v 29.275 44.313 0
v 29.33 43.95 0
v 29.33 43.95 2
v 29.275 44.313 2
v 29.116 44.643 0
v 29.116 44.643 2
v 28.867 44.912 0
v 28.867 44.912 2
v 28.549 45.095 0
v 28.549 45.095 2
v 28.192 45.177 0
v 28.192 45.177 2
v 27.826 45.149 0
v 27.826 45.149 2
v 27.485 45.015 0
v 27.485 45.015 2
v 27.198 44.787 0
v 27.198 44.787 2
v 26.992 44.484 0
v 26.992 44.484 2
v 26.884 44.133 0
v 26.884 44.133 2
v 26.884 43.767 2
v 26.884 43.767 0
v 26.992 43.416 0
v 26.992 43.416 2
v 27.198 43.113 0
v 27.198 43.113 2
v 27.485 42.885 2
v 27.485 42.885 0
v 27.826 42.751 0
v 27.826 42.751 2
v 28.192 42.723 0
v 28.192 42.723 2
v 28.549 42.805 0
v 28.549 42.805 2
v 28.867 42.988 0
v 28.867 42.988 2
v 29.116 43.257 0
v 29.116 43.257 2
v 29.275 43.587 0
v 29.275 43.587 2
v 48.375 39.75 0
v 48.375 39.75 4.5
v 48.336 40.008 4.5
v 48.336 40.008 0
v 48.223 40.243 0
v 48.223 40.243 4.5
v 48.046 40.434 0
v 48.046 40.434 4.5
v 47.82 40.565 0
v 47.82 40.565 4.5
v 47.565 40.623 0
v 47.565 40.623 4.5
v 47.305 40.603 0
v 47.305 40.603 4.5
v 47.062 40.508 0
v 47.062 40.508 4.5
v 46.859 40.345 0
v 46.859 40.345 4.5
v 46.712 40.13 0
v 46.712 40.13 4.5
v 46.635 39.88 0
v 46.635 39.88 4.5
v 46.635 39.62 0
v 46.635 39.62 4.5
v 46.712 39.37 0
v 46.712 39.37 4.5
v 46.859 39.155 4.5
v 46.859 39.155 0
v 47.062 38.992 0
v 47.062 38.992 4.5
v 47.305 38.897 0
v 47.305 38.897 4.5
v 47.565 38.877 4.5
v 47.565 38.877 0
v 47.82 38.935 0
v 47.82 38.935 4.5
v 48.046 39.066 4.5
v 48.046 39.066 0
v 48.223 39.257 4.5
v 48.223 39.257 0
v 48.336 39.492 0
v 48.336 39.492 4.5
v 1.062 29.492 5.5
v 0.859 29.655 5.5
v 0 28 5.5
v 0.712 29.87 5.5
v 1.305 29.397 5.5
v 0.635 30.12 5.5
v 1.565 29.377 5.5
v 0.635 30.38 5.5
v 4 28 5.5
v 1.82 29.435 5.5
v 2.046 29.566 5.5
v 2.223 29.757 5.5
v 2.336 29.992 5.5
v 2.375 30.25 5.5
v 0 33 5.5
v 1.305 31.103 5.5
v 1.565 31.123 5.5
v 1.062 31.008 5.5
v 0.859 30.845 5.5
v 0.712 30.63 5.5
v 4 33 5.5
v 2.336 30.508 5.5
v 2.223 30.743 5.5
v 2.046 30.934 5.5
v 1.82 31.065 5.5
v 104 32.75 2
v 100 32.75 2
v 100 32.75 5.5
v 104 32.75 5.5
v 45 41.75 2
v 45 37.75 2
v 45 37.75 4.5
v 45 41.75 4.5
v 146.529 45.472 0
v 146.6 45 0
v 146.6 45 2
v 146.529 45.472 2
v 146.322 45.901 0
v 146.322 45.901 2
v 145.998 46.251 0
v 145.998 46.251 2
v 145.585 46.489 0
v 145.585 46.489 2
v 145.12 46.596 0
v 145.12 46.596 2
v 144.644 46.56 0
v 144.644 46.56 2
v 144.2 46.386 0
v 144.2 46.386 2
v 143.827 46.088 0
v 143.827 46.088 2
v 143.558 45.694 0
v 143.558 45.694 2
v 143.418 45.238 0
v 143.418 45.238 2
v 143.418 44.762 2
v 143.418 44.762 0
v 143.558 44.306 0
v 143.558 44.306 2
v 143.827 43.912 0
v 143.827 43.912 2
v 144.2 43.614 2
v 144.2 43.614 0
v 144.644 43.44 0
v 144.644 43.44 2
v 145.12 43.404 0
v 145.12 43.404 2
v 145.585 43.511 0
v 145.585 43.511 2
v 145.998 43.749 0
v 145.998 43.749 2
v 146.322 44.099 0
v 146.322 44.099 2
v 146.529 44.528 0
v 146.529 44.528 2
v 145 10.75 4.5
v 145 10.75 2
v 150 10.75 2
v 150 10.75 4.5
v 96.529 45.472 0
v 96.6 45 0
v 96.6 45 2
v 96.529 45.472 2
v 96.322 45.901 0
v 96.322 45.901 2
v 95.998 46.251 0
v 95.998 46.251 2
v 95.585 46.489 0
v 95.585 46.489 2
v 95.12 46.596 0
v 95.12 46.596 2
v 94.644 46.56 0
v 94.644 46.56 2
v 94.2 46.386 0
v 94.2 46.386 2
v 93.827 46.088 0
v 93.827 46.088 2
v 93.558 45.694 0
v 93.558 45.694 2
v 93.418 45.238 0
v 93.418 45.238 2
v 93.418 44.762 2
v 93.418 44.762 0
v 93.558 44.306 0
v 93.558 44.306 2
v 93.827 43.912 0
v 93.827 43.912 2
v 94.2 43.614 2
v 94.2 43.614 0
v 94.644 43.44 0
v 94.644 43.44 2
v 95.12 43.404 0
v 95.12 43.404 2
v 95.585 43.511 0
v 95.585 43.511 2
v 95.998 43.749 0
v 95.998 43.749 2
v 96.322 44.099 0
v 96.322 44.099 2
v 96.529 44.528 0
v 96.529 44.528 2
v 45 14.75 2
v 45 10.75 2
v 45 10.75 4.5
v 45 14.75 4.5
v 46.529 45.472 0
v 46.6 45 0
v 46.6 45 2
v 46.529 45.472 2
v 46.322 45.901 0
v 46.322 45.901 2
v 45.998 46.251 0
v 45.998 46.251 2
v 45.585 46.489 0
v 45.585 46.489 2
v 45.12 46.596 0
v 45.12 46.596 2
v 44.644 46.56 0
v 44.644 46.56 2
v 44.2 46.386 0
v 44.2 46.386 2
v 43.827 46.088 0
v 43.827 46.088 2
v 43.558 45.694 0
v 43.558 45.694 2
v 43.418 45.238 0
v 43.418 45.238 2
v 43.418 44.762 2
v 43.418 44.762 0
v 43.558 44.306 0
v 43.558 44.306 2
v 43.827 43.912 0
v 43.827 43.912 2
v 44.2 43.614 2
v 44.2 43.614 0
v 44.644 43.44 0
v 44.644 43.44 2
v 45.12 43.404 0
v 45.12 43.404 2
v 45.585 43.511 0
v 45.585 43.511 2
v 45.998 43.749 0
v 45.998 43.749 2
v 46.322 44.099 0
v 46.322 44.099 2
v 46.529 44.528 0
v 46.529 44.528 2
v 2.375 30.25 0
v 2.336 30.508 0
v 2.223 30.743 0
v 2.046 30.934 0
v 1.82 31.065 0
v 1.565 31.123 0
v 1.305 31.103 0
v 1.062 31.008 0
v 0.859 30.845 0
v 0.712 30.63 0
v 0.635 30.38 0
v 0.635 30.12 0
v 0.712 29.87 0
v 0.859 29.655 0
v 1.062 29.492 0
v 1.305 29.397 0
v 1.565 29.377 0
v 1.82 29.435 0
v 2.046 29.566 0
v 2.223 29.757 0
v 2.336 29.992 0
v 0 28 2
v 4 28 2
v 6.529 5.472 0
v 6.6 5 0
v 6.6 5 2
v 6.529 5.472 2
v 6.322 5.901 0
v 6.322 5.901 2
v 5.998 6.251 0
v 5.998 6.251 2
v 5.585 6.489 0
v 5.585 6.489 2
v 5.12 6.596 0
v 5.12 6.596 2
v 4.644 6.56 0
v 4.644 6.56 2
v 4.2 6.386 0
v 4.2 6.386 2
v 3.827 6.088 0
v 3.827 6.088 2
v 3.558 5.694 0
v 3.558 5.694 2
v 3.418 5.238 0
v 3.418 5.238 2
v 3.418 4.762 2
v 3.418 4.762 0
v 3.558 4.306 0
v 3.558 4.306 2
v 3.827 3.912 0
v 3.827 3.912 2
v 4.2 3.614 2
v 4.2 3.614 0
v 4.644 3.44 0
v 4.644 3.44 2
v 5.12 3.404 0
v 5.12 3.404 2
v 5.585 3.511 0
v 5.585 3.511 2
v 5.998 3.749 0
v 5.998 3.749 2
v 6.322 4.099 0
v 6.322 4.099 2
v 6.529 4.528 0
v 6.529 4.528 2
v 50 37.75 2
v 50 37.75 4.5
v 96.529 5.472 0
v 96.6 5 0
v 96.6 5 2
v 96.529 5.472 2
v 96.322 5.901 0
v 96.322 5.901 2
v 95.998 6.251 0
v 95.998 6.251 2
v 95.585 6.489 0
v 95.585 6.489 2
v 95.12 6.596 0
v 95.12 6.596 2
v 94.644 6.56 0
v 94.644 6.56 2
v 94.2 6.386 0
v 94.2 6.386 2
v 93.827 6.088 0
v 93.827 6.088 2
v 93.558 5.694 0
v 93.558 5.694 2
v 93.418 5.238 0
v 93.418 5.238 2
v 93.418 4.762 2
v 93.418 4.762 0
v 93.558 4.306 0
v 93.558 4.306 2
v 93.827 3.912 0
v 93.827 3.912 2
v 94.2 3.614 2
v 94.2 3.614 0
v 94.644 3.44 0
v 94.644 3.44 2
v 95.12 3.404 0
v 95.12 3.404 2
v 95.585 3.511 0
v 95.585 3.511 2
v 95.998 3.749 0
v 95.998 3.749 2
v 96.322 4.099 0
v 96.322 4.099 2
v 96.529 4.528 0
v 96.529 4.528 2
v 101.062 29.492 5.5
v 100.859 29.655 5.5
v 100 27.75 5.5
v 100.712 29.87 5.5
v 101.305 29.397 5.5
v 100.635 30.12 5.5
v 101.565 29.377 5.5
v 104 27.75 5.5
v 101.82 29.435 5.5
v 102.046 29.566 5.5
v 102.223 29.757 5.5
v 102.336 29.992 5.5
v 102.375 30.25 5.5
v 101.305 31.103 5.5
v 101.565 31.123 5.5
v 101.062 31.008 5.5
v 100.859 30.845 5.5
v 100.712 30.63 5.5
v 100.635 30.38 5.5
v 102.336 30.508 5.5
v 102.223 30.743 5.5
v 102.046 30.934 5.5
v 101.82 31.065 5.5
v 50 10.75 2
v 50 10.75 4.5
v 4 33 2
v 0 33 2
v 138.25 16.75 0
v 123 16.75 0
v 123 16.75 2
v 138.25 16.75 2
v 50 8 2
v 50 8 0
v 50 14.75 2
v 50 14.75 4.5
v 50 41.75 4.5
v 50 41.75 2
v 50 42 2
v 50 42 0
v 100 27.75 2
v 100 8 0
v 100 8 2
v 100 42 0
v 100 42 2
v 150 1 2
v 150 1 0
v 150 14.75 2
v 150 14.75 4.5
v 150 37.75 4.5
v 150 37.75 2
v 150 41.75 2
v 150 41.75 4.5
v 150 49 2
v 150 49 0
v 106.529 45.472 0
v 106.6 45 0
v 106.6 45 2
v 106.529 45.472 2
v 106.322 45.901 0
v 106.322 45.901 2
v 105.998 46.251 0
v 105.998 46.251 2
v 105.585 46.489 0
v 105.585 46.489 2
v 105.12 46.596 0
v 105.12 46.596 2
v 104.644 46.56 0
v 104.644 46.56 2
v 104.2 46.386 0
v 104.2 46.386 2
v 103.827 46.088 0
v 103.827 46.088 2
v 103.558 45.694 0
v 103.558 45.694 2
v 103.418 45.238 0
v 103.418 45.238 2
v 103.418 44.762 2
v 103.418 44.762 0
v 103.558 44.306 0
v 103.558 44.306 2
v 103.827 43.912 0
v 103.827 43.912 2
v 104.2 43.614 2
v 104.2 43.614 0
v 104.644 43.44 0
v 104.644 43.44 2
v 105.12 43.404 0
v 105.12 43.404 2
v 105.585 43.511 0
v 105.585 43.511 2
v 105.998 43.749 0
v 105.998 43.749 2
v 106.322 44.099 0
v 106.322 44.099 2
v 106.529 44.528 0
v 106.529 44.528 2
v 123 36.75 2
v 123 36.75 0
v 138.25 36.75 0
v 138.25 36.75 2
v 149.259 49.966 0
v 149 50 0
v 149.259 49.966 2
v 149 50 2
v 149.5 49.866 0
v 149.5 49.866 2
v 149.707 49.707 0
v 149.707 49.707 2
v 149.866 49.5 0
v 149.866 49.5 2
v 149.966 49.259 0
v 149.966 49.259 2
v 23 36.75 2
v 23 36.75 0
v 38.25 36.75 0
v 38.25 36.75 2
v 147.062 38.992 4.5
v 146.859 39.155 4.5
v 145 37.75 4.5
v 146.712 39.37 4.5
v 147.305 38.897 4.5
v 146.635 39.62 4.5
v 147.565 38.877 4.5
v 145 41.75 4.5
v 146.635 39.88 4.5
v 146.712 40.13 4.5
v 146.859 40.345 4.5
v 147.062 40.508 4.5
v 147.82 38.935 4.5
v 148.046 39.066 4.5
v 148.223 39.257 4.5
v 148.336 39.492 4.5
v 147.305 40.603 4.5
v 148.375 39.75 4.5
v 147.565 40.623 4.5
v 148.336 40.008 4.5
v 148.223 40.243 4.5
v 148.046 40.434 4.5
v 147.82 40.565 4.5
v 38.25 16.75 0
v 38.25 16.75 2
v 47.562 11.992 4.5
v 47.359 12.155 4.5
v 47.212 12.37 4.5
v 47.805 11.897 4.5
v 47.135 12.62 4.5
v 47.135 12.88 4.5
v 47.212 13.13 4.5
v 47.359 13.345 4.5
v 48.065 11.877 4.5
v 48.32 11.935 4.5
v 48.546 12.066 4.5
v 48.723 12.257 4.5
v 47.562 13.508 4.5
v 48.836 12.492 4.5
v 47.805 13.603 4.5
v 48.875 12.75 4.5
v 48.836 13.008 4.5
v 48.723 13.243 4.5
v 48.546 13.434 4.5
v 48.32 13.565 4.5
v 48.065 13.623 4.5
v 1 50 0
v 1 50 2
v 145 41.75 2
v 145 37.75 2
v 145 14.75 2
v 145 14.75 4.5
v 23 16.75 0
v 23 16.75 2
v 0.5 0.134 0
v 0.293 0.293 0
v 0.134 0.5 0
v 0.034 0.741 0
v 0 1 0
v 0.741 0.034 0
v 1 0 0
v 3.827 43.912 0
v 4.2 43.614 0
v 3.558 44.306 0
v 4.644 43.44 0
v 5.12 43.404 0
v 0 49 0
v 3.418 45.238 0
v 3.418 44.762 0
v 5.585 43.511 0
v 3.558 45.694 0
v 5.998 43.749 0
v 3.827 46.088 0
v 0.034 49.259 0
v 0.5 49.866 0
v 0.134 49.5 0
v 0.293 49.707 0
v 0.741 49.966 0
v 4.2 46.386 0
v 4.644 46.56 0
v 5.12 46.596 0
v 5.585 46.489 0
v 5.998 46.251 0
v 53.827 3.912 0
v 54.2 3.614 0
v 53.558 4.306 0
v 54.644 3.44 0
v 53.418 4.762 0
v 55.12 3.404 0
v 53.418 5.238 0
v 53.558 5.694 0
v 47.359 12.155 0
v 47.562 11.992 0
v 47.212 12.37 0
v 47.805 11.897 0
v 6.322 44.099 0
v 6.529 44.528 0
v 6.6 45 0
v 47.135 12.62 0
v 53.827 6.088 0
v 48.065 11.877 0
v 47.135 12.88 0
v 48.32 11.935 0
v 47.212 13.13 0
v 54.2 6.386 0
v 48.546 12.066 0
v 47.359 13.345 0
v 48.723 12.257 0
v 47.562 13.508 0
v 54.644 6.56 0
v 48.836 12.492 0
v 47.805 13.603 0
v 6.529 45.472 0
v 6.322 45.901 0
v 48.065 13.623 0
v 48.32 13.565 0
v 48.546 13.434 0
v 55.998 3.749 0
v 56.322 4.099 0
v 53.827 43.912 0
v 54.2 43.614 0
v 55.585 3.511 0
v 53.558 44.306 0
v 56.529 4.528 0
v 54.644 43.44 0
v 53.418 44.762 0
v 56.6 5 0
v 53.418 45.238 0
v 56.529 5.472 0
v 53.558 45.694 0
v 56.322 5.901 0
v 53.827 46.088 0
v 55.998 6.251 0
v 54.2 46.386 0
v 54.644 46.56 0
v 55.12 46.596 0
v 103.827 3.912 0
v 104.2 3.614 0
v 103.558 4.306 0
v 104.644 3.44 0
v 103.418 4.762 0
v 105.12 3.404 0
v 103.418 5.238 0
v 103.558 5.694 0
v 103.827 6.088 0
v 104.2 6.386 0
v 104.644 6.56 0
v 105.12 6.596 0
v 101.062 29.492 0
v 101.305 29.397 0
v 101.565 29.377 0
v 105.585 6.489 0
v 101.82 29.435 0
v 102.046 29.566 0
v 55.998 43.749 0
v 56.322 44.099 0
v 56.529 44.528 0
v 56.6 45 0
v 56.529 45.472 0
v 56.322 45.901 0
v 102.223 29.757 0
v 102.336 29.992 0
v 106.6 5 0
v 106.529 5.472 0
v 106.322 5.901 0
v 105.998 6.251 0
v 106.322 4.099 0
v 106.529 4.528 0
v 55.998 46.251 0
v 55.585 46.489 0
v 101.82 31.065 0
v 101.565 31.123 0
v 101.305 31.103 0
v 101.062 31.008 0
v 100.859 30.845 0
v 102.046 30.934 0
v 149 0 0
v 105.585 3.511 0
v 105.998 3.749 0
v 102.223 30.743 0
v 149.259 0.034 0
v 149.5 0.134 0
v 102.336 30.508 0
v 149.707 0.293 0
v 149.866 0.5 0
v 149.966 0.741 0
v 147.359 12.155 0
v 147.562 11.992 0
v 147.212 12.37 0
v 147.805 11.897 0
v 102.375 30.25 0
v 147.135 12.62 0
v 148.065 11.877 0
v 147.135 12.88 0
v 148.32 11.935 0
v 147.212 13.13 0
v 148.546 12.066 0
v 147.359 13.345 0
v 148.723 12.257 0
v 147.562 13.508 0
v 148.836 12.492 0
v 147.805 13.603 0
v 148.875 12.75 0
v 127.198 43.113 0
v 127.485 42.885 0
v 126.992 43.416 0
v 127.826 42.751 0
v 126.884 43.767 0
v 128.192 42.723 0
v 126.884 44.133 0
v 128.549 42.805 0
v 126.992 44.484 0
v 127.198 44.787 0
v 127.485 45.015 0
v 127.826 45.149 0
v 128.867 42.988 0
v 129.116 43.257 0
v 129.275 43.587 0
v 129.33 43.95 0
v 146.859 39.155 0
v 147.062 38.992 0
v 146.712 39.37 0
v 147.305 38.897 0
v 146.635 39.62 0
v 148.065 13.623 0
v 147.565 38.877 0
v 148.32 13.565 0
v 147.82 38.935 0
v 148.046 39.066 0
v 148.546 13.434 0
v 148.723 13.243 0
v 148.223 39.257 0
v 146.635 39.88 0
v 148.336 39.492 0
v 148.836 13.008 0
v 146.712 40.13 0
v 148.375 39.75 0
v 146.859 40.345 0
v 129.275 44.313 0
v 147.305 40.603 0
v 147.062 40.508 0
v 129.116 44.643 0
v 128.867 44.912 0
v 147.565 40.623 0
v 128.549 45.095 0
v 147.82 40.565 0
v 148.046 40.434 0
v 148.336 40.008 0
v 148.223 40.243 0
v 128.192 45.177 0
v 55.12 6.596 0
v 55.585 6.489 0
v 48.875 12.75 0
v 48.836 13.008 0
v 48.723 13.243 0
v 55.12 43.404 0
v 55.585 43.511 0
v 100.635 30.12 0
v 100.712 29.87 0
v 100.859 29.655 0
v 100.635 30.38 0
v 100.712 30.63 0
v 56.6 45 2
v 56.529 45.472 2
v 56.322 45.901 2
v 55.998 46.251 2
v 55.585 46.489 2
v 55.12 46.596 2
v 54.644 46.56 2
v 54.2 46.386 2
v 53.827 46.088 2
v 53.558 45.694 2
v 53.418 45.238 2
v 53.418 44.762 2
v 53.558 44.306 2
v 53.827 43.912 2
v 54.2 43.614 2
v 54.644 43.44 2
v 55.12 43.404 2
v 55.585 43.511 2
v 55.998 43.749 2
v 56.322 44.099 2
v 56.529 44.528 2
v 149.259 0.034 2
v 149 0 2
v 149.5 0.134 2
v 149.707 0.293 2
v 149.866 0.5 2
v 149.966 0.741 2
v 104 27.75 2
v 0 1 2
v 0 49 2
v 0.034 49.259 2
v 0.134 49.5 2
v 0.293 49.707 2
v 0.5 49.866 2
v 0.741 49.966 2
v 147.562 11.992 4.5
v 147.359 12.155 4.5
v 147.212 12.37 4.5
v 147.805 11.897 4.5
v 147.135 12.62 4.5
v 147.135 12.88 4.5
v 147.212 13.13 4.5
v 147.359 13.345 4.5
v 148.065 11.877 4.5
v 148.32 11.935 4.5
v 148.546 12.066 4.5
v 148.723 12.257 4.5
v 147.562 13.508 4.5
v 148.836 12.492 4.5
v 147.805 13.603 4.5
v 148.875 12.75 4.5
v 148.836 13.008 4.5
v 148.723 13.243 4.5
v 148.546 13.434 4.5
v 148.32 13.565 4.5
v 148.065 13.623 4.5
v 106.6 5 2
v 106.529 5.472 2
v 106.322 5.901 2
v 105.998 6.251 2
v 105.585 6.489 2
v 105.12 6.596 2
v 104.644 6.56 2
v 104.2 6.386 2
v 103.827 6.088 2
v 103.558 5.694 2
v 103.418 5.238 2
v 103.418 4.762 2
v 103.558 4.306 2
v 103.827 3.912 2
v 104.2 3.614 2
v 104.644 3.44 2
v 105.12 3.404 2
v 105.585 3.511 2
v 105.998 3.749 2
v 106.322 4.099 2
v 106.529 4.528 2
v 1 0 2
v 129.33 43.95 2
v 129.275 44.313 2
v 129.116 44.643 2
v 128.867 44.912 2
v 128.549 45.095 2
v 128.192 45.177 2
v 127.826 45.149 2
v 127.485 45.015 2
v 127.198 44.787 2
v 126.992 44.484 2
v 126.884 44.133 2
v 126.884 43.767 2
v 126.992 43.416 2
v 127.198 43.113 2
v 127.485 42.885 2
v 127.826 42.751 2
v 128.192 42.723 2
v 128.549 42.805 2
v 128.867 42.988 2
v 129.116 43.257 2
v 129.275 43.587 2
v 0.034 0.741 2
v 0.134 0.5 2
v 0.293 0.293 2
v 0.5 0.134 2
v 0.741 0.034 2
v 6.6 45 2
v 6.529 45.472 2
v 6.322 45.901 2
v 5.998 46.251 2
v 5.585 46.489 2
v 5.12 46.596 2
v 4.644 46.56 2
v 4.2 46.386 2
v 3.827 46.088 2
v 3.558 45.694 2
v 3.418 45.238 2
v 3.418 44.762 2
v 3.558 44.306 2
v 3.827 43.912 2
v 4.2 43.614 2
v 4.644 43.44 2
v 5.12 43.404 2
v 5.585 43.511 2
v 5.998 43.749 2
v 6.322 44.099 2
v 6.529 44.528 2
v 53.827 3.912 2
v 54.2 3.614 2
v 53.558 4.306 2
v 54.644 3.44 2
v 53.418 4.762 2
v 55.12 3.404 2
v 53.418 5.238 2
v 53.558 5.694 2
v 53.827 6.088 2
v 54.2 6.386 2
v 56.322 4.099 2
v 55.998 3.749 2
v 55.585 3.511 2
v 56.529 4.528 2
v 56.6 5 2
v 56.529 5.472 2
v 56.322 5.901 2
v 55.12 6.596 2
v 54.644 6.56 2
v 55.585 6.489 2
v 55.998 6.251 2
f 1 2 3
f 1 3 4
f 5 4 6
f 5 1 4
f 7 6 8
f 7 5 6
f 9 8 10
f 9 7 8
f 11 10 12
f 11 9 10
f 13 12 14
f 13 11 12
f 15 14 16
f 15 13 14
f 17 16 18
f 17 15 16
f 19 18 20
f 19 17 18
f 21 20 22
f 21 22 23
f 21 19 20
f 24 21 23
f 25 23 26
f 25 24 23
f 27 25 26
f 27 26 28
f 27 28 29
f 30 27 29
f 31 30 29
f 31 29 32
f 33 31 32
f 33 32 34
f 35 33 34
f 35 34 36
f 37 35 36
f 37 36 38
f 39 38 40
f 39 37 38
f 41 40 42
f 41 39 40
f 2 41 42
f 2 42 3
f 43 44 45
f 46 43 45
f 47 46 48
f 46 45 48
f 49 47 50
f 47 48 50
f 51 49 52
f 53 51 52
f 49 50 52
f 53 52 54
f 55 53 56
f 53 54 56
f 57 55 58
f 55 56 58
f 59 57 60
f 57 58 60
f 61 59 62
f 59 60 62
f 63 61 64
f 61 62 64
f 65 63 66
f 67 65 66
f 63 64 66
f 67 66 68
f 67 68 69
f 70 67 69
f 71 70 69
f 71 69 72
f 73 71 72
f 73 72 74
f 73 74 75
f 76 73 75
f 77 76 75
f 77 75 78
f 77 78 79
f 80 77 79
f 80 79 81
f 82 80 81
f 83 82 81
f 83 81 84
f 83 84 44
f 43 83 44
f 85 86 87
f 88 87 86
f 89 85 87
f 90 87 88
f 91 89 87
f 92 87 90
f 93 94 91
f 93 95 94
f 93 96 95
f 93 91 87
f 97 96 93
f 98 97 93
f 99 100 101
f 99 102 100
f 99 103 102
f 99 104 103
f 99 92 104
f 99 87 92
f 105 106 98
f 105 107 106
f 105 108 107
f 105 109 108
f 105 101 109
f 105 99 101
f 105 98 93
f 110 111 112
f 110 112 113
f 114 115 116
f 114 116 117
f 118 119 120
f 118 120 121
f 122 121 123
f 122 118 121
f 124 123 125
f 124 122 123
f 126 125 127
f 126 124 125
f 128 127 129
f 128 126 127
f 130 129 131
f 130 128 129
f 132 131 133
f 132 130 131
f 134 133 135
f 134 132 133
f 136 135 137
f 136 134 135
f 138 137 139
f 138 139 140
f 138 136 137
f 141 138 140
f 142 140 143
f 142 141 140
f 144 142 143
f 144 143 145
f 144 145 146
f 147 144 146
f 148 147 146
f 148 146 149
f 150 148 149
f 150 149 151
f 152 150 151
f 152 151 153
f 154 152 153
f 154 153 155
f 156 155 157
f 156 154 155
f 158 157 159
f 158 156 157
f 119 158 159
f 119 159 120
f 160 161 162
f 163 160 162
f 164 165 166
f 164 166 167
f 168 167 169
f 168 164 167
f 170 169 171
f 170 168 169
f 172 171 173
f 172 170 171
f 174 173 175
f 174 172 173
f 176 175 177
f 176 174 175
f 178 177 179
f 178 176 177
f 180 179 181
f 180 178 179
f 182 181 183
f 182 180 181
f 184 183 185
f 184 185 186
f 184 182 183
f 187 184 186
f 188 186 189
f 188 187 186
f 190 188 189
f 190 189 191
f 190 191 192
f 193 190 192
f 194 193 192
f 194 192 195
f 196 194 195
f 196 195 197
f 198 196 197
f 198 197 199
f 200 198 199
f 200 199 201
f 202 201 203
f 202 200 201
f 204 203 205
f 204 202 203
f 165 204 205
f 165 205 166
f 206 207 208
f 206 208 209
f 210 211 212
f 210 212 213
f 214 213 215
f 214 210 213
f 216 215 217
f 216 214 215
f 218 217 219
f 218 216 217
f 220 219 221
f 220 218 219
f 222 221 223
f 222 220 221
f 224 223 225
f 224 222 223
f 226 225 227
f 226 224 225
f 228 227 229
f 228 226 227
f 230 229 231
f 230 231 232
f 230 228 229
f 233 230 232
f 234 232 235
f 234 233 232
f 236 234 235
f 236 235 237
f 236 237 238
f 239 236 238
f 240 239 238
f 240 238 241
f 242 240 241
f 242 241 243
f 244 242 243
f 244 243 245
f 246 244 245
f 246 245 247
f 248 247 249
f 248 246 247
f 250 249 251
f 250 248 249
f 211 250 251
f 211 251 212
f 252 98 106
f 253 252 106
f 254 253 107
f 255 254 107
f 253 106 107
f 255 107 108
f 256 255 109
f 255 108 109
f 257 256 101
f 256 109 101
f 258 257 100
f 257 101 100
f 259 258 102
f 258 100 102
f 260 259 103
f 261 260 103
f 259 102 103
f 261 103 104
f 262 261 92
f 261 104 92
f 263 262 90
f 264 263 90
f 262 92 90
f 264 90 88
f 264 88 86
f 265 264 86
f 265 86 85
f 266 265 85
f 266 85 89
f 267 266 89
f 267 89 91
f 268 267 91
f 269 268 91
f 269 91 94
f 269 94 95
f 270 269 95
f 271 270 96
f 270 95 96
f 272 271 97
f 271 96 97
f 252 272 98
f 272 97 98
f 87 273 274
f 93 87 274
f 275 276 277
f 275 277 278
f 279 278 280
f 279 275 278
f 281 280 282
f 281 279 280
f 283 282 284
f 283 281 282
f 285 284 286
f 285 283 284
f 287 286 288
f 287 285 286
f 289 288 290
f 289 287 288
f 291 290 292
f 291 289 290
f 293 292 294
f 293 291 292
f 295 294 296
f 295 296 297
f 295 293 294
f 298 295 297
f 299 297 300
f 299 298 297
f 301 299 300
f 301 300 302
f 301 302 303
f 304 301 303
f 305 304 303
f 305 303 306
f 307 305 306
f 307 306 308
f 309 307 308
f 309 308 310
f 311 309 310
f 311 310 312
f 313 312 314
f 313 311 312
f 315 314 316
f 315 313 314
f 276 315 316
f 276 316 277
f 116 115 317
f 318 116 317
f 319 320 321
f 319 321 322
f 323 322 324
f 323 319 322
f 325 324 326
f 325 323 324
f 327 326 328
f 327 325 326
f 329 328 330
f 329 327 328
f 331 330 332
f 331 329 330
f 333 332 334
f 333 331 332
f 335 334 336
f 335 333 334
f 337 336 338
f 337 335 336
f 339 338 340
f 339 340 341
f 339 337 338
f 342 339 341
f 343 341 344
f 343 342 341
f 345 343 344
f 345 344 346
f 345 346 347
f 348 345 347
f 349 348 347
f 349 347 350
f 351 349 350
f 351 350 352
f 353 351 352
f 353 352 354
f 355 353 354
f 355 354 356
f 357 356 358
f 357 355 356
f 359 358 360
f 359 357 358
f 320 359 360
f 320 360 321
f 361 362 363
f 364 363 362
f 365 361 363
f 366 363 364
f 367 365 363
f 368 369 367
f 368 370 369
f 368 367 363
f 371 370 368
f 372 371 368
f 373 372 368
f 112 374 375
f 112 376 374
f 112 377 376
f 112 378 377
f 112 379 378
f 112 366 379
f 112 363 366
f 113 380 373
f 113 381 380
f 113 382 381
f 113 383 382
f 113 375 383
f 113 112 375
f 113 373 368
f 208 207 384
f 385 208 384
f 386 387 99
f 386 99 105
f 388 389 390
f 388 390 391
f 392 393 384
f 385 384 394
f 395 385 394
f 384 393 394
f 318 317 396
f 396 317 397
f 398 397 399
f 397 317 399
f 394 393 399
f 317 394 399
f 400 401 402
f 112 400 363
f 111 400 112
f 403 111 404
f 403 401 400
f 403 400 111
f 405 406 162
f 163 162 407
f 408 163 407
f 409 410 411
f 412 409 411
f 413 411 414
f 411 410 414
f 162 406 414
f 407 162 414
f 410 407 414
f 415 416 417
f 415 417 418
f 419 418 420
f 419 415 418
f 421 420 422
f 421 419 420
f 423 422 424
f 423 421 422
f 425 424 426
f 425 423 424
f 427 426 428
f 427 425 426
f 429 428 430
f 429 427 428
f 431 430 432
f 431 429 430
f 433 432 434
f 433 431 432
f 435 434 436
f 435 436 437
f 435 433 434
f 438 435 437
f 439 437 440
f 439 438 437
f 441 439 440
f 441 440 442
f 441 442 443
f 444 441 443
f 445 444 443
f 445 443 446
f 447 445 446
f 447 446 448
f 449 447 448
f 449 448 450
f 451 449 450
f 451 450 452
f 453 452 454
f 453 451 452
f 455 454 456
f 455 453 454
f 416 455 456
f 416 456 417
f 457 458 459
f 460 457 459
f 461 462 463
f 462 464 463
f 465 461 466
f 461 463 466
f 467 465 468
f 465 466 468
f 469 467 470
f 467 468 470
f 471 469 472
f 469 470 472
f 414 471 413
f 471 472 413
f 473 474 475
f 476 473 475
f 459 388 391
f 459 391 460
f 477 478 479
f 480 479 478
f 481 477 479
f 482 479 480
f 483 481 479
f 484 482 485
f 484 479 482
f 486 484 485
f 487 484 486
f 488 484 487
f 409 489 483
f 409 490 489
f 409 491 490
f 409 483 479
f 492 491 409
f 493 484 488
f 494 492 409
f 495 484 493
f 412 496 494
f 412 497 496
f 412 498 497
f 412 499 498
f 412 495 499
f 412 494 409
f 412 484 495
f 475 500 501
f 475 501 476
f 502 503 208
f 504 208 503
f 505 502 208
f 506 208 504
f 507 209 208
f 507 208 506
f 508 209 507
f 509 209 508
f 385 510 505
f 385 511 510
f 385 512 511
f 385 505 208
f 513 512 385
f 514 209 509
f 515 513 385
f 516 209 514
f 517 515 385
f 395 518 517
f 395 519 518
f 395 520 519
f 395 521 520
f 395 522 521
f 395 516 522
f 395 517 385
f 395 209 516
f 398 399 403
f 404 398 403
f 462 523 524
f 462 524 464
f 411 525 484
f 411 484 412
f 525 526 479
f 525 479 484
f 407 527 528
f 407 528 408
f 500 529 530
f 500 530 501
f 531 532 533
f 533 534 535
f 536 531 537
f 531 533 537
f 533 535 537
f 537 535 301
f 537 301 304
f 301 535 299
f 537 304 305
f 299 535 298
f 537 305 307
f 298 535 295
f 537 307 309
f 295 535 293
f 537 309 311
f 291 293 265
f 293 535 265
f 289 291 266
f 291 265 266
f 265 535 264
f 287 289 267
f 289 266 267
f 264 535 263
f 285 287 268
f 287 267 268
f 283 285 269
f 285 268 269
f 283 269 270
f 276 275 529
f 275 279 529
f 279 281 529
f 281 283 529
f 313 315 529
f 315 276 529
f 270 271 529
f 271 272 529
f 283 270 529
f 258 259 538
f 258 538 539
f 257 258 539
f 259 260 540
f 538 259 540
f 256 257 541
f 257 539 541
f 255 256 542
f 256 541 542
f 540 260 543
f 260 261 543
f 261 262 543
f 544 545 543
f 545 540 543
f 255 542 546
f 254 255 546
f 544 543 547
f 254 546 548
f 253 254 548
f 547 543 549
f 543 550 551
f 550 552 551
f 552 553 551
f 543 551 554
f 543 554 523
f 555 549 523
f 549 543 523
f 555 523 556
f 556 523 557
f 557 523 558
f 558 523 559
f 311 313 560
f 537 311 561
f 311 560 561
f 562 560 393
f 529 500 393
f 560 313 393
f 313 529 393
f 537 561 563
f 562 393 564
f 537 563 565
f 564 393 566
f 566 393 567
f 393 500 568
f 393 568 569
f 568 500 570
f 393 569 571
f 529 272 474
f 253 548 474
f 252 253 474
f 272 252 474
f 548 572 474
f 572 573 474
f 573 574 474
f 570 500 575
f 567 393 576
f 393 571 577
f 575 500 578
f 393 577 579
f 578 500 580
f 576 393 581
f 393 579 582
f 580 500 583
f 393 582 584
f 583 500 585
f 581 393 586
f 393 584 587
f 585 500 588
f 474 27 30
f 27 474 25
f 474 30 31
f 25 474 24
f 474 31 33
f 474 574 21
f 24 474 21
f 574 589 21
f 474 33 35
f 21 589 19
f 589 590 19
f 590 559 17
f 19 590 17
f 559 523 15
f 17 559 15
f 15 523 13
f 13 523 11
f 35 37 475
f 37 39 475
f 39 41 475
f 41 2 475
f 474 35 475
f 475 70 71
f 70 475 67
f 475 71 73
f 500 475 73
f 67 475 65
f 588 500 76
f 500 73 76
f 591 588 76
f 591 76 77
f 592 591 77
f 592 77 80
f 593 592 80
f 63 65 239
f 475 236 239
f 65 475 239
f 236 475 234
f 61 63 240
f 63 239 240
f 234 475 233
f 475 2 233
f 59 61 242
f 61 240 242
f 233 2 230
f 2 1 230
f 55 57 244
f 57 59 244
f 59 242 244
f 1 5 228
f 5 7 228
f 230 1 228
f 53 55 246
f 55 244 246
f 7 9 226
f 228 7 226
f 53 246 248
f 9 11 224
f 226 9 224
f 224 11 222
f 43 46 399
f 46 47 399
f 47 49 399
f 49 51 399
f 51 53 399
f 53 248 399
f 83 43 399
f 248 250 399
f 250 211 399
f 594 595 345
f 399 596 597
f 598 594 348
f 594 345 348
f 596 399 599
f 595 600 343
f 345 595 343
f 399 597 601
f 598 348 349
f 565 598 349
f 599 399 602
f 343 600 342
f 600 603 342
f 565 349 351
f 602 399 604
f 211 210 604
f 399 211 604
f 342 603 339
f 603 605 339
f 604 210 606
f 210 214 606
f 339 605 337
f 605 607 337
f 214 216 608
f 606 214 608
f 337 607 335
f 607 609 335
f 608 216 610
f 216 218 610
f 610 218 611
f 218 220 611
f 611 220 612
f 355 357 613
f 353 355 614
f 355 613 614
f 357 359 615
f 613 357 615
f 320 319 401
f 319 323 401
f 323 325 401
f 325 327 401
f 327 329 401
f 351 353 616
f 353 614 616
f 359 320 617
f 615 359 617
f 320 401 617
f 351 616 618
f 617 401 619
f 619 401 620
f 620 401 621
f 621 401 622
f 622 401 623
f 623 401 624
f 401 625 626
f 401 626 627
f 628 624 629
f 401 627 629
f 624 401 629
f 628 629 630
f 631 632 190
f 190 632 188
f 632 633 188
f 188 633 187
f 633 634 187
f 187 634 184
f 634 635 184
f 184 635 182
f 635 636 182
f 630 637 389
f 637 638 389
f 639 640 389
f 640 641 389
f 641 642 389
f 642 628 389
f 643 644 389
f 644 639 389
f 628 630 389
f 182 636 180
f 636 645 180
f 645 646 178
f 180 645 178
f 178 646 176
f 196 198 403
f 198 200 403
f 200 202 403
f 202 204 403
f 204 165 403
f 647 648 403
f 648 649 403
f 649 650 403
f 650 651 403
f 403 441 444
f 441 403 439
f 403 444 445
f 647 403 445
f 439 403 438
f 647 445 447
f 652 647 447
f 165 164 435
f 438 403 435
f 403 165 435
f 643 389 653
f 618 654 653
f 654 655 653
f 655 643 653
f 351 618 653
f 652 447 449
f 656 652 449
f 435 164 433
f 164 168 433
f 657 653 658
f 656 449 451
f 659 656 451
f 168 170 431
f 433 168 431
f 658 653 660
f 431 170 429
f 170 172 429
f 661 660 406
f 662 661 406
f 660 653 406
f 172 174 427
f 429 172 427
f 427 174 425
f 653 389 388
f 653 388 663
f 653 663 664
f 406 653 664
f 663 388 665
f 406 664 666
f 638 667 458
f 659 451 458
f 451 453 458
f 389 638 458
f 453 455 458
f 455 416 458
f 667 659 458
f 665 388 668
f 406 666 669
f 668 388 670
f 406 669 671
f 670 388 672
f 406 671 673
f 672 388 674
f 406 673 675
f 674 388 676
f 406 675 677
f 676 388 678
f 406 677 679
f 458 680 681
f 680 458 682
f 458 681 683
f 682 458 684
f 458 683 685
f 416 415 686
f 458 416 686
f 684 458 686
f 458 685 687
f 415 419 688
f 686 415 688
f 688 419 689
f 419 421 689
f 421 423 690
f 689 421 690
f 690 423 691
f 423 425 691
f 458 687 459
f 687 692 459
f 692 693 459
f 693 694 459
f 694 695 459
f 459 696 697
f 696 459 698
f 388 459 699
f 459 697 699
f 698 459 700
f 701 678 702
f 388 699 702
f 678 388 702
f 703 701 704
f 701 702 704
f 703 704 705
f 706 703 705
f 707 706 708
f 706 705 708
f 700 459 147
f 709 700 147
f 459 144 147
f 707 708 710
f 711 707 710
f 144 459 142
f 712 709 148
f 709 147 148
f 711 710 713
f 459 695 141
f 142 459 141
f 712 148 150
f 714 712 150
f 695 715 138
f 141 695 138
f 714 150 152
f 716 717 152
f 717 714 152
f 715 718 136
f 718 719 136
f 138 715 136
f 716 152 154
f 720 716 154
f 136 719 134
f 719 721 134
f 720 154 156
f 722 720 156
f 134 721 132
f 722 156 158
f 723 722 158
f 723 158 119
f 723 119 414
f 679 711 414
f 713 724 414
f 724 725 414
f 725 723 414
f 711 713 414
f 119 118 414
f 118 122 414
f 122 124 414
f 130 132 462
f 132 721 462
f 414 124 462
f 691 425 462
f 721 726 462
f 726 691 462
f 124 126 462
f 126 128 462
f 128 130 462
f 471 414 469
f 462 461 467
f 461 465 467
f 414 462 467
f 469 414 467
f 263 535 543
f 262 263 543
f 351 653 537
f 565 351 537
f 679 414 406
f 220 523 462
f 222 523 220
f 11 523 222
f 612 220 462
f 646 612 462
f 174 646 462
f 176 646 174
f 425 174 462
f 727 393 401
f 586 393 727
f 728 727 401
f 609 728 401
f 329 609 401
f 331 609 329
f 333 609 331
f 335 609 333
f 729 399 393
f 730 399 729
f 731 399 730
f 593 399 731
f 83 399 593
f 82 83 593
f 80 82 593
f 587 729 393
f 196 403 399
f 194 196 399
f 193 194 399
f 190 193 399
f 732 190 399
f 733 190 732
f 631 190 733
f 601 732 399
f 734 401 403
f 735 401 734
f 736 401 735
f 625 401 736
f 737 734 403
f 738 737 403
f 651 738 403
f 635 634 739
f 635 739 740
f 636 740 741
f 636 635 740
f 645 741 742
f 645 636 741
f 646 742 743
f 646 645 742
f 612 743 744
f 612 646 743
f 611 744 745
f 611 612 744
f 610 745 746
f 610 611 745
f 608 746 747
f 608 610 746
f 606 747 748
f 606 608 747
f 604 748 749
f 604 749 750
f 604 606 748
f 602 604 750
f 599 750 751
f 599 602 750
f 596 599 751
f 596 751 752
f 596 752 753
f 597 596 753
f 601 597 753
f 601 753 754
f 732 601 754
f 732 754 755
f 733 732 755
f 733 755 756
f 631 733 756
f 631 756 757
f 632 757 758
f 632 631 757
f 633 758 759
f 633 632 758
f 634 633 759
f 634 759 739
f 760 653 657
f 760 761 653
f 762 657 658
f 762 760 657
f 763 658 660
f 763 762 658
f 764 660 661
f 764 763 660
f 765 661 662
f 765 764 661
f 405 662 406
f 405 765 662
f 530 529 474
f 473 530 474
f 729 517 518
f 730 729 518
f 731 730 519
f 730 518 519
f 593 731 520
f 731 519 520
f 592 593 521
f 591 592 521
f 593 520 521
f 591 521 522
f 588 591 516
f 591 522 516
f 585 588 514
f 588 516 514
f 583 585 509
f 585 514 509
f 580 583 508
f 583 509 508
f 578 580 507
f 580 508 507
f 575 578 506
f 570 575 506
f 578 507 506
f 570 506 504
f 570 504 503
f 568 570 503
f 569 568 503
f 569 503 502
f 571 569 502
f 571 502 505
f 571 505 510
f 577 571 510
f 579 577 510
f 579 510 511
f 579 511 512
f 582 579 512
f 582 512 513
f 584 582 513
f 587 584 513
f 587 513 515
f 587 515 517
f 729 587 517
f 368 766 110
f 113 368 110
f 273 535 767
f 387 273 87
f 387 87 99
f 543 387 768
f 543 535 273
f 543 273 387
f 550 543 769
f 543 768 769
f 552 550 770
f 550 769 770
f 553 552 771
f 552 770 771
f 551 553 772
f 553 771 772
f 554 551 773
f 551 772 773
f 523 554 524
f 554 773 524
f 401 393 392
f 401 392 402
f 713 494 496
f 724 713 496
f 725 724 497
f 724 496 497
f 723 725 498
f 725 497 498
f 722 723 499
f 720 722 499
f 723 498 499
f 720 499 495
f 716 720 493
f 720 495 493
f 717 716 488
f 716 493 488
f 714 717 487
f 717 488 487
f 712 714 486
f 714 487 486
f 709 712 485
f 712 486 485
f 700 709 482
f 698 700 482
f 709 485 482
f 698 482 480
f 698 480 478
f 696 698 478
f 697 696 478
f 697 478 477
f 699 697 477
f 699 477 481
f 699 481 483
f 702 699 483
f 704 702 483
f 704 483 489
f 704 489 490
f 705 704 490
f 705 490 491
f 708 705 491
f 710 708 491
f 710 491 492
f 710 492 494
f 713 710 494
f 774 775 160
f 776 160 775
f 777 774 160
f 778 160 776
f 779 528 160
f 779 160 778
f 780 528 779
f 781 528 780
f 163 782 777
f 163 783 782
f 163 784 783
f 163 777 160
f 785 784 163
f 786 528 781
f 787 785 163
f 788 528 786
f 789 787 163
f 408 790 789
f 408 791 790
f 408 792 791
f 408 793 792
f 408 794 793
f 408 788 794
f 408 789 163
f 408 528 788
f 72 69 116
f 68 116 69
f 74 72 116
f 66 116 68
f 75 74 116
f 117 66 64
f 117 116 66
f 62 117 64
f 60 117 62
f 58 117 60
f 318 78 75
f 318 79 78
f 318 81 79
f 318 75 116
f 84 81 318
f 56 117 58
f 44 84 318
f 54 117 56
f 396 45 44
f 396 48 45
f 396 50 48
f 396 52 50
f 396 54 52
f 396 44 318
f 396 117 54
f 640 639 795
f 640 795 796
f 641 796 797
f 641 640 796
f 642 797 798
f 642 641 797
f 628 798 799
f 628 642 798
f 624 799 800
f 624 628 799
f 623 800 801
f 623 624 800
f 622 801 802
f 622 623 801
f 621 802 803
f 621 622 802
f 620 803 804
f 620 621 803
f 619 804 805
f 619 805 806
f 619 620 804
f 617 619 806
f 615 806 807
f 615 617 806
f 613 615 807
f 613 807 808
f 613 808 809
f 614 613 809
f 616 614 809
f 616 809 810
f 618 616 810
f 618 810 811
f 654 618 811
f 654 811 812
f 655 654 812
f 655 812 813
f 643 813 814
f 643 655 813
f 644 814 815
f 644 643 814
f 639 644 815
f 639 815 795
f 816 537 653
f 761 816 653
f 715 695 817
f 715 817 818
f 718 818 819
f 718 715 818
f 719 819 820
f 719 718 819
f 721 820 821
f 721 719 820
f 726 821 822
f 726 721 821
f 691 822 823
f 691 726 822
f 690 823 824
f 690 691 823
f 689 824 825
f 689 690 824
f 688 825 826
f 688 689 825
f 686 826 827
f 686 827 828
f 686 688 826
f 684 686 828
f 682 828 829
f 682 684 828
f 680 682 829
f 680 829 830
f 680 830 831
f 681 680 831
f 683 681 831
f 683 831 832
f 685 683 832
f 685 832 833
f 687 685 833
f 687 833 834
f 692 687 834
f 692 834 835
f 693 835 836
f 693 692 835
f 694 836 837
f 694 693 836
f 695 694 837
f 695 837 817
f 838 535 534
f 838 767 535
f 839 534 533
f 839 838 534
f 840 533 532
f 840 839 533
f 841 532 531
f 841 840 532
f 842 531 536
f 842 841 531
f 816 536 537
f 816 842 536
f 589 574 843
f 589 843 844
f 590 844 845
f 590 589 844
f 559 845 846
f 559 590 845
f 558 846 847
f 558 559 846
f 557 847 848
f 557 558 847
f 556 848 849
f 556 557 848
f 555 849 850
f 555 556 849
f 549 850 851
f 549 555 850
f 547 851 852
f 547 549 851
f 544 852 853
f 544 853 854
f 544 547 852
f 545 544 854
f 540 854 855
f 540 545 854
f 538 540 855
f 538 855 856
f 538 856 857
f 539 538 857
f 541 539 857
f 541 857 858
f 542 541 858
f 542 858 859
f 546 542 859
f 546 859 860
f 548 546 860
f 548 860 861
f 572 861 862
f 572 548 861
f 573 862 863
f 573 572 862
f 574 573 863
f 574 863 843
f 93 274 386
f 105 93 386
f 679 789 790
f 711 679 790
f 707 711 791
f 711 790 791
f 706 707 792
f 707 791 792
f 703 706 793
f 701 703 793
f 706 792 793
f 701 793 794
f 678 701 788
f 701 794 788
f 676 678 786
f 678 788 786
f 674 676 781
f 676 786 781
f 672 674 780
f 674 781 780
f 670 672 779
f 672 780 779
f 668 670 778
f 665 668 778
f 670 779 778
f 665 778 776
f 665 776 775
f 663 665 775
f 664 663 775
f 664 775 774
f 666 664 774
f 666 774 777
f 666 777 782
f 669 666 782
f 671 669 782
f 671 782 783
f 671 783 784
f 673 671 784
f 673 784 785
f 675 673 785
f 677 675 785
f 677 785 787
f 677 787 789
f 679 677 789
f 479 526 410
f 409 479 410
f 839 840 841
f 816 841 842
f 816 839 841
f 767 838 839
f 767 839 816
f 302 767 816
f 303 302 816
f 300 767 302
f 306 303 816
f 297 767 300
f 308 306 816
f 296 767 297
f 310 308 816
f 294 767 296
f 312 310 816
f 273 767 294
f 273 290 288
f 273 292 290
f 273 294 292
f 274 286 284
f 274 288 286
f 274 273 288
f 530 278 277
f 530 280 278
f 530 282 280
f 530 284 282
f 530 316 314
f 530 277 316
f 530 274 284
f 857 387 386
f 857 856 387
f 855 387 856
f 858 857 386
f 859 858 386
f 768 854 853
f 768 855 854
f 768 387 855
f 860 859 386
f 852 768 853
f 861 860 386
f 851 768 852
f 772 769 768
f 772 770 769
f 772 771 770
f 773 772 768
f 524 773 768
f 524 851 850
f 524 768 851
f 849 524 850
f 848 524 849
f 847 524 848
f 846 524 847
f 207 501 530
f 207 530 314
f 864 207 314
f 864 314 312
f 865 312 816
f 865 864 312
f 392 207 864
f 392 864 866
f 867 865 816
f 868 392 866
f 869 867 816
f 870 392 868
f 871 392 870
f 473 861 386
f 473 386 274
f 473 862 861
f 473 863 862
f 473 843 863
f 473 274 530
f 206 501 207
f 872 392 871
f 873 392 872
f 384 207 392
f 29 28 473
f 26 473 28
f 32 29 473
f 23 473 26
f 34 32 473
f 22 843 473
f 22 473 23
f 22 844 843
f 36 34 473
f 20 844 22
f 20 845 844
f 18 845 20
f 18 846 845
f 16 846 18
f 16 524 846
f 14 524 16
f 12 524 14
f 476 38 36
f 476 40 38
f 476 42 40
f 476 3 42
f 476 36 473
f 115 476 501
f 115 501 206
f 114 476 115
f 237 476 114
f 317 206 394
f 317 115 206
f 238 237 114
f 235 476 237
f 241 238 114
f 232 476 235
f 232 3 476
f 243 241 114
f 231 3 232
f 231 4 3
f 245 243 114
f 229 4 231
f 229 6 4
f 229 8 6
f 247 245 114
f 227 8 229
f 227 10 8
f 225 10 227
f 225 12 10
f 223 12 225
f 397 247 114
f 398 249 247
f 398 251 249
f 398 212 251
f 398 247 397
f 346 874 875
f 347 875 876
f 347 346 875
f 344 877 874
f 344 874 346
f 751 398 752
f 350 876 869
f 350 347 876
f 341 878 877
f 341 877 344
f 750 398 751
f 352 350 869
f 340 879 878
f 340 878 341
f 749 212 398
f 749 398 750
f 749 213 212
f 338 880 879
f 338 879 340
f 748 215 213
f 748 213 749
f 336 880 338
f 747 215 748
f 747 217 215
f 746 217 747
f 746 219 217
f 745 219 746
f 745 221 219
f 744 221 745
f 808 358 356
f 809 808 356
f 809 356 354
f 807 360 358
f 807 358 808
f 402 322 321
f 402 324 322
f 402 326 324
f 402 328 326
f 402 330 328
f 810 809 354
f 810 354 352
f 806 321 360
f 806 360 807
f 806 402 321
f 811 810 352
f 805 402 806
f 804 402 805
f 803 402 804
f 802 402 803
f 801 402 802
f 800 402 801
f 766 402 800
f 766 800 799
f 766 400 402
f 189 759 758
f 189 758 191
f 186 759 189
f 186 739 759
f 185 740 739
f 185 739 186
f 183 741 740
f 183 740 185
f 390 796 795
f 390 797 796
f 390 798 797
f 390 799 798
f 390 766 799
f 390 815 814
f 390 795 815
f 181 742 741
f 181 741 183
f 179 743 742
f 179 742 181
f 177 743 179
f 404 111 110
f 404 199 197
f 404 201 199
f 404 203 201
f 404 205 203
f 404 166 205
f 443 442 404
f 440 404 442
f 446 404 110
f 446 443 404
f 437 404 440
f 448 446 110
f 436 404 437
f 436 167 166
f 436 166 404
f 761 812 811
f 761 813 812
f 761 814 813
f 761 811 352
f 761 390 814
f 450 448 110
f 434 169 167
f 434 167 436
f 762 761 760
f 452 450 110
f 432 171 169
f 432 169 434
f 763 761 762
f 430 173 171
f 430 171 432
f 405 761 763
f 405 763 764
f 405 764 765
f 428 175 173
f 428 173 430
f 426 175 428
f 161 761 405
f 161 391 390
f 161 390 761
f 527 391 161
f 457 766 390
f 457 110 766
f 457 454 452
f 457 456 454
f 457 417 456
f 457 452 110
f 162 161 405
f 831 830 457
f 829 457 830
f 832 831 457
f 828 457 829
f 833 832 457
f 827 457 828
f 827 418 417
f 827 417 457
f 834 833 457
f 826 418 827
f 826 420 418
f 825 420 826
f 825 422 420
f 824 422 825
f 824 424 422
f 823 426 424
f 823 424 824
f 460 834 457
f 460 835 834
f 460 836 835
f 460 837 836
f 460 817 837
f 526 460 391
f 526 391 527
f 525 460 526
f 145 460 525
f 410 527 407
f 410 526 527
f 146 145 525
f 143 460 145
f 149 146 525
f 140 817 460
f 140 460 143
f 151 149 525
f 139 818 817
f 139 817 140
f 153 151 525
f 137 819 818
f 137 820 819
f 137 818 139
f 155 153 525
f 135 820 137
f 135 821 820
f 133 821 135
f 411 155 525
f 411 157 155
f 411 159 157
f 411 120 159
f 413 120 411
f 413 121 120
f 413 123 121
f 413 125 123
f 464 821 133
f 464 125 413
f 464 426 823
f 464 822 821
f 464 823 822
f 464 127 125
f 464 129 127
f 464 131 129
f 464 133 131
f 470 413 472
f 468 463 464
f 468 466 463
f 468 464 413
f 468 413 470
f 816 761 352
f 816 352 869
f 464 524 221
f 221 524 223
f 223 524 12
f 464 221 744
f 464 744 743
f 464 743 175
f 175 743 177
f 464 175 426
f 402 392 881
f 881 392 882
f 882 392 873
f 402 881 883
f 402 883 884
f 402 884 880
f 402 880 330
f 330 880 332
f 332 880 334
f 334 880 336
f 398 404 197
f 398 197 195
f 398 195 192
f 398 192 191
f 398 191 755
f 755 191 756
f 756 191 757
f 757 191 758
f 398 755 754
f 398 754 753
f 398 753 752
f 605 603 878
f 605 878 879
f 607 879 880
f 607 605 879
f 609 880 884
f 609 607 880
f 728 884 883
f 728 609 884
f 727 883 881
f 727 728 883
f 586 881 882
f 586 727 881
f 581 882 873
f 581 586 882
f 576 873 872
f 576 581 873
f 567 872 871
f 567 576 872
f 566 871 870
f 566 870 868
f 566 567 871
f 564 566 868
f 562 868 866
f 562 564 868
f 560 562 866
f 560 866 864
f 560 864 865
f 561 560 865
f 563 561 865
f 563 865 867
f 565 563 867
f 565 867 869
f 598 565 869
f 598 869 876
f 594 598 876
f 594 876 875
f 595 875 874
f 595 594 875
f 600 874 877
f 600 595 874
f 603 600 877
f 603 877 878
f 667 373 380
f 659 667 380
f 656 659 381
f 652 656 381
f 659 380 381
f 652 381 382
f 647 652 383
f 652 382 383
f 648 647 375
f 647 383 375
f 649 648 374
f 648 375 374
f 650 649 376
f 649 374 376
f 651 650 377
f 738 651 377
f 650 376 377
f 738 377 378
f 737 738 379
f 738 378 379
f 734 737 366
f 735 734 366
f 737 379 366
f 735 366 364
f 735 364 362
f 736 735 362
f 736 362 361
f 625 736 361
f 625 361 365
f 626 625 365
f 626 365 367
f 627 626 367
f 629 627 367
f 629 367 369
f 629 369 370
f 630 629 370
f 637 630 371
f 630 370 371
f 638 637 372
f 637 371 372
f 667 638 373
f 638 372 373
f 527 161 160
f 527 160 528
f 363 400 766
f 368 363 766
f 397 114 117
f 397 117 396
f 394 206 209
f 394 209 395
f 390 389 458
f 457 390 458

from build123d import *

# Parameters (mm, degrees)
SKETCH_W        = 150
SKETCH_H        = 50
SKETCH_R        = 1.6
SKETCH_R_2      = 1.23
SKETCH_W_2      = 50
SKETCH_H_2      = 34
SKETCH_W_3      = 15.25
SKETCH_H_3      = 20
PAD_DEPTH       = 2
SKETCH001_W     = 5
SKETCH001_H     = 4
SKETCH001_W_2   = 4
SKETCH001_H_2   = 5
PAD001_DEPTH    = 3.5
SKETCH002_R     = 0.875
POCKET_DEPTH    = 5.5
SKETCH003_W     = 5
SKETCH003_H     = 4
POCKET001_DEPTH = 1
FILLET_R        = 1


with BuildPart() as part:
    # Sketch → Pad (new body)
    with BuildSketch(Plane.XY):
        with Locations((75, 25)):
            Rectangle(SKETCH_W, SKETCH_H)
        with Locations((5, 45)):
            Circle(SKETCH_R, mode=Mode.SUBTRACT)
        with Locations((5, 5)):
            Circle(SKETCH_R, mode=Mode.SUBTRACT)
        with Locations((45, 45)):
            Circle(SKETCH_R, mode=Mode.SUBTRACT)
        with Locations((55, 45)):
            Circle(SKETCH_R, mode=Mode.SUBTRACT)
        with Locations((55, 5)):
            Circle(SKETCH_R, mode=Mode.SUBTRACT)
        with Locations((95, 45)):
            Circle(SKETCH_R, mode=Mode.SUBTRACT)
        with Locations((105, 45)):
            Circle(SKETCH_R, mode=Mode.SUBTRACT)
        with Locations((95, 5)):
            Circle(SKETCH_R, mode=Mode.SUBTRACT)
        with Locations((105, 5)):
            Circle(SKETCH_R, mode=Mode.SUBTRACT)
        with Locations((145, 45)):
            Circle(SKETCH_R, mode=Mode.SUBTRACT)
        with Locations((128.1, 43.95)):
            Circle(SKETCH_R_2, mode=Mode.SUBTRACT)
        with Locations((28.1, 43.95)):
            Circle(SKETCH_R_2, mode=Mode.SUBTRACT)
        with Locations((75, 25)):
            Rectangle(SKETCH_W_2, SKETCH_H_2, mode=Mode.SUBTRACT)
        with Locations((30.625, 26.75)):
            Rectangle(SKETCH_W_3, SKETCH_H_3, mode=Mode.SUBTRACT)
        with Locations((130.625, 26.75)):
            Rectangle(SKETCH_W_3, SKETCH_H_3, mode=Mode.SUBTRACT)
    extrude(amount=PAD_DEPTH)

    # Sketch001 (on Face30 of Pad) → Pad001 (join)
    with BuildSketch(Plane.XY.offset(2)):
        with Locations((47.5, 39.75)):
            Rectangle(SKETCH001_W, SKETCH001_H)
        with Locations((47.5, 12.75)):
            Rectangle(SKETCH001_W, SKETCH001_H)
        with Locations((2, 30.5)):
            Rectangle(SKETCH001_W_2, SKETCH001_H_2)
        with Locations((147.5, 39.75)):
            Rectangle(SKETCH001_W, SKETCH001_H)
        with Locations((147.5, 12.75)):
            Rectangle(SKETCH001_W, SKETCH001_H)
        with Locations((102, 30.25)):
            Rectangle(SKETCH001_W_2, SKETCH001_H_2)
    extrude(amount=PAD001_DEPTH)

    # Sketch002 (on Face58 of Pad001) → Pocket (cut)
    with BuildSketch(Plane.XY.offset(5.5)):
        with Locations((47.5, 39.75)):
            Circle(SKETCH002_R)
        with Locations((48, 12.75)):
            Circle(SKETCH002_R)
        with Locations((101.5, 30.25)):
            Circle(SKETCH002_R)
        with Locations((1.5, 30.25)):
            Circle(SKETCH002_R)
        with Locations((147.5, 39.75)):
            Circle(SKETCH002_R)
        with Locations((148, 12.75)):
            Circle(SKETCH002_R)
    extrude(amount=-POCKET_DEPTH, mode=Mode.SUBTRACT)

    # Sketch003 (on Face62 of Pocket) → Pocket001 (cut)
    with BuildSketch(Plane.XY.offset(5.5)):
        with Locations((47.5, 39.75)):
            Rectangle(SKETCH003_W, SKETCH003_H)
        with Locations((47.5, 12.75)):
            Rectangle(SKETCH003_W, SKETCH003_H)
        with Locations((147.5, 12.75)):
            Rectangle(SKETCH003_W, SKETCH003_H)
        with Locations((147.5, 39.75)):
            Rectangle(SKETCH003_W, SKETCH003_H)
    extrude(amount=-POCKET001_DEPTH, mode=Mode.SUBTRACT)

    # Fillet
    fillet_edges = [part.edges().sort_by_distance(p)[0] for p in [
        (0, 0, 1),
        (0, 50, 1),
        (150, 0, 1),
        (150, 50, 1),
    ]]
    fillet(fillet_edges, radius=FILLET_R)


solid = part.part
